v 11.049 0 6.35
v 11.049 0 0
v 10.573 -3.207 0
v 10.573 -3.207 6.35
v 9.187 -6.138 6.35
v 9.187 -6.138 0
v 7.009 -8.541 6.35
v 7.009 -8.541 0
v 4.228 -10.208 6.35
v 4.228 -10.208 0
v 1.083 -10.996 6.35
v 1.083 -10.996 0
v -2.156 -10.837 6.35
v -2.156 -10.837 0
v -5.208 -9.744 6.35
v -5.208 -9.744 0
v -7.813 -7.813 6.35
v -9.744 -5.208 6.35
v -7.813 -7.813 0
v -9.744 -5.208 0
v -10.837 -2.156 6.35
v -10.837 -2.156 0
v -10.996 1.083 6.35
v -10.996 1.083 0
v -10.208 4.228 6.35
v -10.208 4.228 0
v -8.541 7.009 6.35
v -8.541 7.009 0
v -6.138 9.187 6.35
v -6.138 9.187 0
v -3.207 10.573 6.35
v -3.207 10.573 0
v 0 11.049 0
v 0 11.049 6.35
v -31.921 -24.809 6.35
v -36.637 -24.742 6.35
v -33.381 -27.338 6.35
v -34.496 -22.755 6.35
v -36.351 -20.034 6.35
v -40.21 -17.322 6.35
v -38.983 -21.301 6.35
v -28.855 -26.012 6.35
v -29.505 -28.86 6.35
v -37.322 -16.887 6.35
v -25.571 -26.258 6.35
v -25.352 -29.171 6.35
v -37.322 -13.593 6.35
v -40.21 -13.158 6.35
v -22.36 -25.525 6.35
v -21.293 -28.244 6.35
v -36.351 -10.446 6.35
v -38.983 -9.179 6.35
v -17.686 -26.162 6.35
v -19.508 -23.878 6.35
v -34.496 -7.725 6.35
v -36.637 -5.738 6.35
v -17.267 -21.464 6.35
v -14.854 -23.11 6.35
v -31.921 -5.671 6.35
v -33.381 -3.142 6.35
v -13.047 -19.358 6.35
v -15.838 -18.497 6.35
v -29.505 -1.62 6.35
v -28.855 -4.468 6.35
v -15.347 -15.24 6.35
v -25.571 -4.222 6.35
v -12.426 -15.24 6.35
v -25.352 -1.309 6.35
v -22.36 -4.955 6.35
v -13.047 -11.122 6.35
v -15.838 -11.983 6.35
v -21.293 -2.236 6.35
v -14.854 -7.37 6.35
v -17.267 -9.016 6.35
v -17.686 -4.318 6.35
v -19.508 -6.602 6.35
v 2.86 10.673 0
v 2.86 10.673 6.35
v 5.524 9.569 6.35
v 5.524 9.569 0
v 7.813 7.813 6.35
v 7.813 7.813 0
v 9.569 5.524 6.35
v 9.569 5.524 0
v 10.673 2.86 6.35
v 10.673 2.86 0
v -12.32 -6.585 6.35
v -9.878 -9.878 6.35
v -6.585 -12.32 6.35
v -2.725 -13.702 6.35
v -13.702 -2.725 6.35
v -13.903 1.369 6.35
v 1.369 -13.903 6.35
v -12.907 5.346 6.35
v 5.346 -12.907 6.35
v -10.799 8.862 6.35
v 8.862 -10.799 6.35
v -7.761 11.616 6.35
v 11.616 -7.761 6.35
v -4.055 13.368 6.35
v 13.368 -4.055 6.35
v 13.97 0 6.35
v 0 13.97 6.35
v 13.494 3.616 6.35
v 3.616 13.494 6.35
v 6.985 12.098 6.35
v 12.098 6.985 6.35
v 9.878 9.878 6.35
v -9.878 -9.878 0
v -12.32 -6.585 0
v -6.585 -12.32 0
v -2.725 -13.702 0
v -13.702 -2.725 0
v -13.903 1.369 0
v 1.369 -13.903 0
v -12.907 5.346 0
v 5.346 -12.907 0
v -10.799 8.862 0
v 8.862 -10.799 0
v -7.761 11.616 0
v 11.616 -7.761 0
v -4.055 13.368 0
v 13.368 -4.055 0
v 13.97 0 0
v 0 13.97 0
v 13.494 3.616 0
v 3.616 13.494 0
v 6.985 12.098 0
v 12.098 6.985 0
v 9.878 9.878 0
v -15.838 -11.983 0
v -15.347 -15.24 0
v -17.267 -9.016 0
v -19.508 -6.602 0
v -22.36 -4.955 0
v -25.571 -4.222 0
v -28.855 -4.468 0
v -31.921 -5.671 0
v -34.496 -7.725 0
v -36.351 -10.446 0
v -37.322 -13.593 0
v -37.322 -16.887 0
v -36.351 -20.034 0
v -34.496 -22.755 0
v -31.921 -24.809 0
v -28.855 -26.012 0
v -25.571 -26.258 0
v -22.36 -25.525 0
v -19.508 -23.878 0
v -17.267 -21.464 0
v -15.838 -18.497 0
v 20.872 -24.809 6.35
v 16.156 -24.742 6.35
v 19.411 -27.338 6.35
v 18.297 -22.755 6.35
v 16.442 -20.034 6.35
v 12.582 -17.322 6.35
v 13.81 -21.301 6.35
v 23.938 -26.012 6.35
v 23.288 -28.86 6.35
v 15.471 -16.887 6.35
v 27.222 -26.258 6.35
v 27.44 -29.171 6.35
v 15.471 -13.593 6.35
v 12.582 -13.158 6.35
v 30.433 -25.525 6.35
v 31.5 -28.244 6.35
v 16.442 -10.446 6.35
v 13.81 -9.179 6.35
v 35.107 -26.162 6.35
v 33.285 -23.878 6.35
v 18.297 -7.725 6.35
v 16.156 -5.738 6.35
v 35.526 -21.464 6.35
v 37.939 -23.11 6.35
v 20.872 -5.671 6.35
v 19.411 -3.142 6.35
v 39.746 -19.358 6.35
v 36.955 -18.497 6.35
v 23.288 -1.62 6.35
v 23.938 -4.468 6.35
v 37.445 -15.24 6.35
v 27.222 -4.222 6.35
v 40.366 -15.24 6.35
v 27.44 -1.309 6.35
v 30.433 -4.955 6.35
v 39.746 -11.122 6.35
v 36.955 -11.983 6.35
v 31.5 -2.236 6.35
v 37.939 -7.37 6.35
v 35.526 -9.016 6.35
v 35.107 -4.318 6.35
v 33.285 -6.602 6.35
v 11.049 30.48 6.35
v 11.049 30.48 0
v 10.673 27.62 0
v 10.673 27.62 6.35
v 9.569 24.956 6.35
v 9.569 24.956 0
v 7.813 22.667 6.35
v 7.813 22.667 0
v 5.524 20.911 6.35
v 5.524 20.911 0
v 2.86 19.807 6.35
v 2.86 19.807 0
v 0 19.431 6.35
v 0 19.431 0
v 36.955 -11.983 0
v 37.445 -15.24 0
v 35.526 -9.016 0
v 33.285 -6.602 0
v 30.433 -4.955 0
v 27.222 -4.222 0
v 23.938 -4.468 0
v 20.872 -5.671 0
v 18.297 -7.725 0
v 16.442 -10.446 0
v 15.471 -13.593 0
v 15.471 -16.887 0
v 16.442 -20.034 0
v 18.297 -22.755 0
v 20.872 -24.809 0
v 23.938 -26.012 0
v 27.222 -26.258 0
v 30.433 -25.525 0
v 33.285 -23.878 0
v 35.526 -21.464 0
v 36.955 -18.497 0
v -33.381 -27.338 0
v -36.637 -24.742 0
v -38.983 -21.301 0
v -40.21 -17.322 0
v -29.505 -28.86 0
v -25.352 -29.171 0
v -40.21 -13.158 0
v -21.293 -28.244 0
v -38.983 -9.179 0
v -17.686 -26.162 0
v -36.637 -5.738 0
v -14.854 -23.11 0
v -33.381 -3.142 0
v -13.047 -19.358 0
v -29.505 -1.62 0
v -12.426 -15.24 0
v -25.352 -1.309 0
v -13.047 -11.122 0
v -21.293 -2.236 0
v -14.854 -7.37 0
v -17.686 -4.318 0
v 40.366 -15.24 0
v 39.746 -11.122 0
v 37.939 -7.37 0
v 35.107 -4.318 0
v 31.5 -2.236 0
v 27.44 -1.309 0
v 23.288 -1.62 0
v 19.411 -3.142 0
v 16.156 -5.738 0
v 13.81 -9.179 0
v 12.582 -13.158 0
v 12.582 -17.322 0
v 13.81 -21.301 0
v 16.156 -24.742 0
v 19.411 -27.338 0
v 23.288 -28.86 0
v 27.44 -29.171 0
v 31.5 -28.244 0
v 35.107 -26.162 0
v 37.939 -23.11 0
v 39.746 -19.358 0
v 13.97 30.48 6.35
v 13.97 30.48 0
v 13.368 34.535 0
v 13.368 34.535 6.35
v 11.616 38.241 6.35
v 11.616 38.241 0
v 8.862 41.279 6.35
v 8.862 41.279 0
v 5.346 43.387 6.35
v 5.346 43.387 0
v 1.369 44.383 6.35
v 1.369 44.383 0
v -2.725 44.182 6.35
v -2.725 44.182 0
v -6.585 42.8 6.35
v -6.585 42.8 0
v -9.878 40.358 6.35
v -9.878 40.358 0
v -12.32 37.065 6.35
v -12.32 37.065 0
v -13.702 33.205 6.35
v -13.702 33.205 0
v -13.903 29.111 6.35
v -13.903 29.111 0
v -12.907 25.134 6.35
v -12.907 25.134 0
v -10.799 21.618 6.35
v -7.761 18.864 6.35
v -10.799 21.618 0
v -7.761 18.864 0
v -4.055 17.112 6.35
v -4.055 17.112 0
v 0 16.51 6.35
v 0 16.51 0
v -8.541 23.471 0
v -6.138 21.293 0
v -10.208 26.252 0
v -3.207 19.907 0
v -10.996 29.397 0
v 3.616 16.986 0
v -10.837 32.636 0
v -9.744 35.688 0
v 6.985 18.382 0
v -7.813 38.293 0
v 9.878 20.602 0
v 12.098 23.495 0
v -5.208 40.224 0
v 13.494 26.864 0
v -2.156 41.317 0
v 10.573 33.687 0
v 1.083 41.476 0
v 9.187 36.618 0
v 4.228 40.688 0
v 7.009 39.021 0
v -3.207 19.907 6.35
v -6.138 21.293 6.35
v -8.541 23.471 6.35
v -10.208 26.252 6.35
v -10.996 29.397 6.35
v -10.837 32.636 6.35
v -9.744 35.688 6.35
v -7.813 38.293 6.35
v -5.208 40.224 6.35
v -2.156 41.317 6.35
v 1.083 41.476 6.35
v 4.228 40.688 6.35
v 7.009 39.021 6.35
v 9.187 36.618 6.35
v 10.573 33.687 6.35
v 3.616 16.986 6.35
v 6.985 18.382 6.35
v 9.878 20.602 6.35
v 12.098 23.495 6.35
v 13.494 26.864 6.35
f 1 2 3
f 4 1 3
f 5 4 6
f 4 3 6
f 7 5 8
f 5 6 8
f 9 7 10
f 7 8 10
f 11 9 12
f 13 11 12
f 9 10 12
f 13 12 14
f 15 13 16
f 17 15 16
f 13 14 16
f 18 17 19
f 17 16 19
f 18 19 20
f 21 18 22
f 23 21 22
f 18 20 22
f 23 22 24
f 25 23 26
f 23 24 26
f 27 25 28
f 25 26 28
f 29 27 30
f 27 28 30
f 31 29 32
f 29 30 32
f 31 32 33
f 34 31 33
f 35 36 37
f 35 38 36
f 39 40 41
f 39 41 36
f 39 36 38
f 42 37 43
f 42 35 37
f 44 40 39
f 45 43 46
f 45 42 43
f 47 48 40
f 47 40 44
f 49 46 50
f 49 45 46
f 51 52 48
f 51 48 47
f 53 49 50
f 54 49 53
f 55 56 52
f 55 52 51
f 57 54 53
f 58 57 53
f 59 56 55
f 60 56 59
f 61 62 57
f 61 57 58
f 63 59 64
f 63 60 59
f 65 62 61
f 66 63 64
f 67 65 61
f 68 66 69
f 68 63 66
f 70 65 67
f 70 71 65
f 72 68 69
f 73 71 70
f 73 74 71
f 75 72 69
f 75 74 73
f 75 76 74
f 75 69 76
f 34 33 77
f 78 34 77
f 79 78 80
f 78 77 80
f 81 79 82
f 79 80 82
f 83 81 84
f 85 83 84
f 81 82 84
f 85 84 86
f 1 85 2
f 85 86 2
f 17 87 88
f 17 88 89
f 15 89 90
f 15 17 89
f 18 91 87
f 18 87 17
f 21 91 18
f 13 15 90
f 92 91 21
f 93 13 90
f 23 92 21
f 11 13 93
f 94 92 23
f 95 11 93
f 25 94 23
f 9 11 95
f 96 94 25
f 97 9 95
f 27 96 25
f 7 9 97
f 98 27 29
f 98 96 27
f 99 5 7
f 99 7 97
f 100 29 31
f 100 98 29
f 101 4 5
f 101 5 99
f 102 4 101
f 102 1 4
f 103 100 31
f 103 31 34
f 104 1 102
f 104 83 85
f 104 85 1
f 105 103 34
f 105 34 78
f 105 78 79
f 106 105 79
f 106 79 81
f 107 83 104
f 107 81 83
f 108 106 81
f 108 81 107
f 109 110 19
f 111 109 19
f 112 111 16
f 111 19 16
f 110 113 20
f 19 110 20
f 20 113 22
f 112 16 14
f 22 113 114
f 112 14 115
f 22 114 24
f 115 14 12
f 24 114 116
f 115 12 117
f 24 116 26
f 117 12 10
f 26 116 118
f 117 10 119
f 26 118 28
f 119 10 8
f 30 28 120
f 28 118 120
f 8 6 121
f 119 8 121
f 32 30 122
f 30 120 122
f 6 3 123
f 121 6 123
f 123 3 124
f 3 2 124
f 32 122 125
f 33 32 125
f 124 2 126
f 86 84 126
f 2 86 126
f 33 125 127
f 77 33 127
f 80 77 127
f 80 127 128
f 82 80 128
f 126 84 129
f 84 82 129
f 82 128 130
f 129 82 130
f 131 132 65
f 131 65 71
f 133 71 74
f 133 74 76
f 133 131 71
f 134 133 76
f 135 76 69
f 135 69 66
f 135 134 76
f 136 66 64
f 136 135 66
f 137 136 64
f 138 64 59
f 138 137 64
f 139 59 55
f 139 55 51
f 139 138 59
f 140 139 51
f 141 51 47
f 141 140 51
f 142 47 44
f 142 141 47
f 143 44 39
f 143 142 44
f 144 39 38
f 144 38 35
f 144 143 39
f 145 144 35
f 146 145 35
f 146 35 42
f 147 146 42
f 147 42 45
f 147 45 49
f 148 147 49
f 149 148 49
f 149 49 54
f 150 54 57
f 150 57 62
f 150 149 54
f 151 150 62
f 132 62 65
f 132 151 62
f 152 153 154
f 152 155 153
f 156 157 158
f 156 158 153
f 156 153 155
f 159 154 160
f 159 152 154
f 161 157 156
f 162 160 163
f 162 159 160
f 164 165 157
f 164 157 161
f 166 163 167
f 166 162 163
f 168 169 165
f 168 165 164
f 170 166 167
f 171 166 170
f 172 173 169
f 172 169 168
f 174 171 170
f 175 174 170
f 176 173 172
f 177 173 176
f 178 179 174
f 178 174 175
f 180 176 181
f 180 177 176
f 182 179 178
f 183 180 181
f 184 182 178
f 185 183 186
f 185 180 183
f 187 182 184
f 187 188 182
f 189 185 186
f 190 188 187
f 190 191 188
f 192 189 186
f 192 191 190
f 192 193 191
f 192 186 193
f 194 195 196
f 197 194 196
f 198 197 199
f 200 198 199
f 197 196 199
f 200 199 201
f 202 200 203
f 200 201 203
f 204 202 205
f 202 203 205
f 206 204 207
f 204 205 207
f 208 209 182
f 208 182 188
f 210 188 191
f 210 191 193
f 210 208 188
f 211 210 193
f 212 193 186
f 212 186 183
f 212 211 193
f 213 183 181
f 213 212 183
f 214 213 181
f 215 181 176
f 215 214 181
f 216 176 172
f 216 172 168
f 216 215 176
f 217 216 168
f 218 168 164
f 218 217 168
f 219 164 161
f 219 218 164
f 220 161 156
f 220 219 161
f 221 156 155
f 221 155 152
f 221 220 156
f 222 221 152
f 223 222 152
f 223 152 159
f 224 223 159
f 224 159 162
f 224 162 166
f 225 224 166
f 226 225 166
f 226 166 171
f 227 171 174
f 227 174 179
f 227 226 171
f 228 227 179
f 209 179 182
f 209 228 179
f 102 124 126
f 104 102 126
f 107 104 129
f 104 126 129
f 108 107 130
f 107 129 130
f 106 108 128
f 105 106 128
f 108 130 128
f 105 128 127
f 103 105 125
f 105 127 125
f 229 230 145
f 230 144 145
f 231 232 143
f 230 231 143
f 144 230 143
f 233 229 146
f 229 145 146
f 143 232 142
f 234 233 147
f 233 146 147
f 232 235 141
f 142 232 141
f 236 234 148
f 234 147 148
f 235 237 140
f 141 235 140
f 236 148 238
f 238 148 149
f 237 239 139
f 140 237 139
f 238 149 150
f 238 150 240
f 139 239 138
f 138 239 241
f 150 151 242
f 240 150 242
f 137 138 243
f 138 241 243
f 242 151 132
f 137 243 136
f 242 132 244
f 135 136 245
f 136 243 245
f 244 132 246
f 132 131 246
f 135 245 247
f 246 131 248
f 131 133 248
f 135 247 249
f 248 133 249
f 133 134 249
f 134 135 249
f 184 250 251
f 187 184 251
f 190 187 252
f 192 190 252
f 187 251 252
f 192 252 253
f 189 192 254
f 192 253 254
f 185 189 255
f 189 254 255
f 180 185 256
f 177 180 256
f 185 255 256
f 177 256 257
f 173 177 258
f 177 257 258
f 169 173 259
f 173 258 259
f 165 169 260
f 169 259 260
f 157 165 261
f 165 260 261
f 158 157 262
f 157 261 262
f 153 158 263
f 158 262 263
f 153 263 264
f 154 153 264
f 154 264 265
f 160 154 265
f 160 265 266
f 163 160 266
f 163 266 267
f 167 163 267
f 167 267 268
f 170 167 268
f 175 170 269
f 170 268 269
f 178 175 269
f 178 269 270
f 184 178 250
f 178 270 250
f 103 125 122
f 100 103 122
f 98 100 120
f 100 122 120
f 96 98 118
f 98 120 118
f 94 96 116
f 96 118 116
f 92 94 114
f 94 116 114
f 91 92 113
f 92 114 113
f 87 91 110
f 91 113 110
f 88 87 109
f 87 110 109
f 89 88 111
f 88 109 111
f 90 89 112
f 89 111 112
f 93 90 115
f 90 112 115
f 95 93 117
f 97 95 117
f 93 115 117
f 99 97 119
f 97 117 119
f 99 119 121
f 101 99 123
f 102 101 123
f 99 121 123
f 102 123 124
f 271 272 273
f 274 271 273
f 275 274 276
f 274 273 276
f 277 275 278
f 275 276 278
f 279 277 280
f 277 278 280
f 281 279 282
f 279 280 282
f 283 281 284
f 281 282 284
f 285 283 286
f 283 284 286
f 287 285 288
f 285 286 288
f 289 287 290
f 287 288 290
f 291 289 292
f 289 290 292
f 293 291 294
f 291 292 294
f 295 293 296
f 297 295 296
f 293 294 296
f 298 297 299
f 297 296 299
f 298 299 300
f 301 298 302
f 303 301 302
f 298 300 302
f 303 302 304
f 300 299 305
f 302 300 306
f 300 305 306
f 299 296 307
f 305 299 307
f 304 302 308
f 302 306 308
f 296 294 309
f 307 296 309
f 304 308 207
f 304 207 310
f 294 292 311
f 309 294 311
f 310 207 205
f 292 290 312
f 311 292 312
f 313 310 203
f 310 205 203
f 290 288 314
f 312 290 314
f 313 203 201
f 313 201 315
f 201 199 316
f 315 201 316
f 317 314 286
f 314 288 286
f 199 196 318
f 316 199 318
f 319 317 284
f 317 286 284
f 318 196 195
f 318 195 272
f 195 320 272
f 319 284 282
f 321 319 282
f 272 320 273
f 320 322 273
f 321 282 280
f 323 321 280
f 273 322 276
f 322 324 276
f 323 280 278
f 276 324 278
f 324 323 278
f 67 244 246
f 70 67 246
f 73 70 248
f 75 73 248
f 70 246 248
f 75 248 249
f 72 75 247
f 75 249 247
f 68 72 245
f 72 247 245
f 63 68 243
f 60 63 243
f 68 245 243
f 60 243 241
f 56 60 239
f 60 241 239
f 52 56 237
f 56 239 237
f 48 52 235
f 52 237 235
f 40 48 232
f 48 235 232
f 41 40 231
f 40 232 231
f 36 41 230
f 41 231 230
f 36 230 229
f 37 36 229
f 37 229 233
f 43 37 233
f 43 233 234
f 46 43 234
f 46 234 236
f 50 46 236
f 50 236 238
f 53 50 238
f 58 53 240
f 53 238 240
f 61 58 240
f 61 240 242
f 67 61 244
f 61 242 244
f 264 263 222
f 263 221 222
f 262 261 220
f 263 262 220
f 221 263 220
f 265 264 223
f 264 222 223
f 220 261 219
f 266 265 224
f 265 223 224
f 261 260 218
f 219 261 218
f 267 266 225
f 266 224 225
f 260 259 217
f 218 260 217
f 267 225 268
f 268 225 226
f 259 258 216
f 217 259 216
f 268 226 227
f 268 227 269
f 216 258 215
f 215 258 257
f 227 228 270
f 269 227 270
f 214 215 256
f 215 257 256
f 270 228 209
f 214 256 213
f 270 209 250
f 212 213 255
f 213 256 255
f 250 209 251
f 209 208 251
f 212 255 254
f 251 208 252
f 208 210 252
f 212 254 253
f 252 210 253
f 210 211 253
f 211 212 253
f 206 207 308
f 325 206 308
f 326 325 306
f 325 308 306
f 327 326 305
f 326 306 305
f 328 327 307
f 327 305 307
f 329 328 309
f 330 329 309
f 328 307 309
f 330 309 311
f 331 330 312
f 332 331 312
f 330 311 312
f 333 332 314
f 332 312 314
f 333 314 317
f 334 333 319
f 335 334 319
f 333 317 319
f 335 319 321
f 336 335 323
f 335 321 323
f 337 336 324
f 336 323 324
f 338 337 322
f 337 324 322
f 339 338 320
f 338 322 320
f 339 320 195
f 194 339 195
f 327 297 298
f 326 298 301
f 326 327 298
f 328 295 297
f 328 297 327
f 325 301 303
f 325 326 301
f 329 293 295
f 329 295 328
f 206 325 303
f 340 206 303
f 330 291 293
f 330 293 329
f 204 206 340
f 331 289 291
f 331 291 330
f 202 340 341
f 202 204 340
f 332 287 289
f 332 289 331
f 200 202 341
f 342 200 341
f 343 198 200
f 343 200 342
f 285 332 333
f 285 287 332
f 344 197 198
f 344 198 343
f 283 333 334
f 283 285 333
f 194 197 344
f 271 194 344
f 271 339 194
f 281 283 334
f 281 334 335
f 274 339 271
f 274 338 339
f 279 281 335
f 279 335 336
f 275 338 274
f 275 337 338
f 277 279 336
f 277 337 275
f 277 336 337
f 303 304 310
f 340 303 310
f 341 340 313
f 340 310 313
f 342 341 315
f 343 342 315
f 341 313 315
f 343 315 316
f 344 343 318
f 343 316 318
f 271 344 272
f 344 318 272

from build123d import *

# Parameters (mm, degrees)
F1_DEPTH = 6.35
F0_R     = 13.97
F0_R_2   = 11.049


with BuildPart() as f1:
    # F0 (on Top) → F1 (new body)
    with BuildSketch(Plane.XY):
        with BuildLine():
            ThreePointArc((13.97, 30.48), (-9.8782817332, 40.3582817332), (0, 16.51))
            ThreePointArc((0, 16.51), (9.8782817332, 20.6017182668), (13.97, 30.48))
        make_face()
        with BuildLine():
            ThreePointArc((11.049, 30.48), (7.8128228253, 22.6671771747), (0, 19.431))
            ThreePointArc((0, 19.431), (-7.8128228253, 38.2928228253), (11.049, 30.48))
        make_face(mode=Mode.SUBTRACT)
    extrude(amount=F1_DEPTH)


with BuildPart() as f1b:
    # F0 (on Top) → F1, piece 2 (new body)
    with BuildSketch(Plane.XY):
        with Locations((26.3964543073, -15.24)):
            Circle(F0_R)
        with Locations((26.3964543073, -15.24)):
            Circle(F0_R_2, mode=Mode.SUBTRACT)
    extrude(amount=F1_DEPTH)


with BuildPart() as f1c:
    # F0 (on Top) → F1, piece 3 (new body)
    with BuildSketch(Plane.XY):
        with Locations((-26.3964543073, -15.24)):
            Circle(F0_R)
        with Locations((-26.3964543073, -15.24)):
            Circle(F0_R_2, mode=Mode.SUBTRACT)
    extrude(amount=F1_DEPTH)


with BuildPart() as f1d:
    # F0 (on Top) → F1, piece 4 (new body)
    with BuildSketch(Plane.XY):
        with BuildLine():
            ThreePointArc((13.97, 0), (9.8782817332, 9.8782817332), (0, 13.97))
            ThreePointArc((0, 13.97), (-9.8782817332, -9.8782817332), (13.97, 0))
        make_face()
        with BuildLine():
            ThreePointArc((0, 11.049), (7.8128228253, 7.8128228253), (11.049, 0))
            ThreePointArc((11.049, 0), (-7.8128228253, -7.8128228253), (0, 11.049))
        make_face(mode=Mode.SUBTRACT)
    extrude(amount=F1_DEPTH)


solid = Compound([f1.part, f1b.part, f1c.part, f1d.part])
